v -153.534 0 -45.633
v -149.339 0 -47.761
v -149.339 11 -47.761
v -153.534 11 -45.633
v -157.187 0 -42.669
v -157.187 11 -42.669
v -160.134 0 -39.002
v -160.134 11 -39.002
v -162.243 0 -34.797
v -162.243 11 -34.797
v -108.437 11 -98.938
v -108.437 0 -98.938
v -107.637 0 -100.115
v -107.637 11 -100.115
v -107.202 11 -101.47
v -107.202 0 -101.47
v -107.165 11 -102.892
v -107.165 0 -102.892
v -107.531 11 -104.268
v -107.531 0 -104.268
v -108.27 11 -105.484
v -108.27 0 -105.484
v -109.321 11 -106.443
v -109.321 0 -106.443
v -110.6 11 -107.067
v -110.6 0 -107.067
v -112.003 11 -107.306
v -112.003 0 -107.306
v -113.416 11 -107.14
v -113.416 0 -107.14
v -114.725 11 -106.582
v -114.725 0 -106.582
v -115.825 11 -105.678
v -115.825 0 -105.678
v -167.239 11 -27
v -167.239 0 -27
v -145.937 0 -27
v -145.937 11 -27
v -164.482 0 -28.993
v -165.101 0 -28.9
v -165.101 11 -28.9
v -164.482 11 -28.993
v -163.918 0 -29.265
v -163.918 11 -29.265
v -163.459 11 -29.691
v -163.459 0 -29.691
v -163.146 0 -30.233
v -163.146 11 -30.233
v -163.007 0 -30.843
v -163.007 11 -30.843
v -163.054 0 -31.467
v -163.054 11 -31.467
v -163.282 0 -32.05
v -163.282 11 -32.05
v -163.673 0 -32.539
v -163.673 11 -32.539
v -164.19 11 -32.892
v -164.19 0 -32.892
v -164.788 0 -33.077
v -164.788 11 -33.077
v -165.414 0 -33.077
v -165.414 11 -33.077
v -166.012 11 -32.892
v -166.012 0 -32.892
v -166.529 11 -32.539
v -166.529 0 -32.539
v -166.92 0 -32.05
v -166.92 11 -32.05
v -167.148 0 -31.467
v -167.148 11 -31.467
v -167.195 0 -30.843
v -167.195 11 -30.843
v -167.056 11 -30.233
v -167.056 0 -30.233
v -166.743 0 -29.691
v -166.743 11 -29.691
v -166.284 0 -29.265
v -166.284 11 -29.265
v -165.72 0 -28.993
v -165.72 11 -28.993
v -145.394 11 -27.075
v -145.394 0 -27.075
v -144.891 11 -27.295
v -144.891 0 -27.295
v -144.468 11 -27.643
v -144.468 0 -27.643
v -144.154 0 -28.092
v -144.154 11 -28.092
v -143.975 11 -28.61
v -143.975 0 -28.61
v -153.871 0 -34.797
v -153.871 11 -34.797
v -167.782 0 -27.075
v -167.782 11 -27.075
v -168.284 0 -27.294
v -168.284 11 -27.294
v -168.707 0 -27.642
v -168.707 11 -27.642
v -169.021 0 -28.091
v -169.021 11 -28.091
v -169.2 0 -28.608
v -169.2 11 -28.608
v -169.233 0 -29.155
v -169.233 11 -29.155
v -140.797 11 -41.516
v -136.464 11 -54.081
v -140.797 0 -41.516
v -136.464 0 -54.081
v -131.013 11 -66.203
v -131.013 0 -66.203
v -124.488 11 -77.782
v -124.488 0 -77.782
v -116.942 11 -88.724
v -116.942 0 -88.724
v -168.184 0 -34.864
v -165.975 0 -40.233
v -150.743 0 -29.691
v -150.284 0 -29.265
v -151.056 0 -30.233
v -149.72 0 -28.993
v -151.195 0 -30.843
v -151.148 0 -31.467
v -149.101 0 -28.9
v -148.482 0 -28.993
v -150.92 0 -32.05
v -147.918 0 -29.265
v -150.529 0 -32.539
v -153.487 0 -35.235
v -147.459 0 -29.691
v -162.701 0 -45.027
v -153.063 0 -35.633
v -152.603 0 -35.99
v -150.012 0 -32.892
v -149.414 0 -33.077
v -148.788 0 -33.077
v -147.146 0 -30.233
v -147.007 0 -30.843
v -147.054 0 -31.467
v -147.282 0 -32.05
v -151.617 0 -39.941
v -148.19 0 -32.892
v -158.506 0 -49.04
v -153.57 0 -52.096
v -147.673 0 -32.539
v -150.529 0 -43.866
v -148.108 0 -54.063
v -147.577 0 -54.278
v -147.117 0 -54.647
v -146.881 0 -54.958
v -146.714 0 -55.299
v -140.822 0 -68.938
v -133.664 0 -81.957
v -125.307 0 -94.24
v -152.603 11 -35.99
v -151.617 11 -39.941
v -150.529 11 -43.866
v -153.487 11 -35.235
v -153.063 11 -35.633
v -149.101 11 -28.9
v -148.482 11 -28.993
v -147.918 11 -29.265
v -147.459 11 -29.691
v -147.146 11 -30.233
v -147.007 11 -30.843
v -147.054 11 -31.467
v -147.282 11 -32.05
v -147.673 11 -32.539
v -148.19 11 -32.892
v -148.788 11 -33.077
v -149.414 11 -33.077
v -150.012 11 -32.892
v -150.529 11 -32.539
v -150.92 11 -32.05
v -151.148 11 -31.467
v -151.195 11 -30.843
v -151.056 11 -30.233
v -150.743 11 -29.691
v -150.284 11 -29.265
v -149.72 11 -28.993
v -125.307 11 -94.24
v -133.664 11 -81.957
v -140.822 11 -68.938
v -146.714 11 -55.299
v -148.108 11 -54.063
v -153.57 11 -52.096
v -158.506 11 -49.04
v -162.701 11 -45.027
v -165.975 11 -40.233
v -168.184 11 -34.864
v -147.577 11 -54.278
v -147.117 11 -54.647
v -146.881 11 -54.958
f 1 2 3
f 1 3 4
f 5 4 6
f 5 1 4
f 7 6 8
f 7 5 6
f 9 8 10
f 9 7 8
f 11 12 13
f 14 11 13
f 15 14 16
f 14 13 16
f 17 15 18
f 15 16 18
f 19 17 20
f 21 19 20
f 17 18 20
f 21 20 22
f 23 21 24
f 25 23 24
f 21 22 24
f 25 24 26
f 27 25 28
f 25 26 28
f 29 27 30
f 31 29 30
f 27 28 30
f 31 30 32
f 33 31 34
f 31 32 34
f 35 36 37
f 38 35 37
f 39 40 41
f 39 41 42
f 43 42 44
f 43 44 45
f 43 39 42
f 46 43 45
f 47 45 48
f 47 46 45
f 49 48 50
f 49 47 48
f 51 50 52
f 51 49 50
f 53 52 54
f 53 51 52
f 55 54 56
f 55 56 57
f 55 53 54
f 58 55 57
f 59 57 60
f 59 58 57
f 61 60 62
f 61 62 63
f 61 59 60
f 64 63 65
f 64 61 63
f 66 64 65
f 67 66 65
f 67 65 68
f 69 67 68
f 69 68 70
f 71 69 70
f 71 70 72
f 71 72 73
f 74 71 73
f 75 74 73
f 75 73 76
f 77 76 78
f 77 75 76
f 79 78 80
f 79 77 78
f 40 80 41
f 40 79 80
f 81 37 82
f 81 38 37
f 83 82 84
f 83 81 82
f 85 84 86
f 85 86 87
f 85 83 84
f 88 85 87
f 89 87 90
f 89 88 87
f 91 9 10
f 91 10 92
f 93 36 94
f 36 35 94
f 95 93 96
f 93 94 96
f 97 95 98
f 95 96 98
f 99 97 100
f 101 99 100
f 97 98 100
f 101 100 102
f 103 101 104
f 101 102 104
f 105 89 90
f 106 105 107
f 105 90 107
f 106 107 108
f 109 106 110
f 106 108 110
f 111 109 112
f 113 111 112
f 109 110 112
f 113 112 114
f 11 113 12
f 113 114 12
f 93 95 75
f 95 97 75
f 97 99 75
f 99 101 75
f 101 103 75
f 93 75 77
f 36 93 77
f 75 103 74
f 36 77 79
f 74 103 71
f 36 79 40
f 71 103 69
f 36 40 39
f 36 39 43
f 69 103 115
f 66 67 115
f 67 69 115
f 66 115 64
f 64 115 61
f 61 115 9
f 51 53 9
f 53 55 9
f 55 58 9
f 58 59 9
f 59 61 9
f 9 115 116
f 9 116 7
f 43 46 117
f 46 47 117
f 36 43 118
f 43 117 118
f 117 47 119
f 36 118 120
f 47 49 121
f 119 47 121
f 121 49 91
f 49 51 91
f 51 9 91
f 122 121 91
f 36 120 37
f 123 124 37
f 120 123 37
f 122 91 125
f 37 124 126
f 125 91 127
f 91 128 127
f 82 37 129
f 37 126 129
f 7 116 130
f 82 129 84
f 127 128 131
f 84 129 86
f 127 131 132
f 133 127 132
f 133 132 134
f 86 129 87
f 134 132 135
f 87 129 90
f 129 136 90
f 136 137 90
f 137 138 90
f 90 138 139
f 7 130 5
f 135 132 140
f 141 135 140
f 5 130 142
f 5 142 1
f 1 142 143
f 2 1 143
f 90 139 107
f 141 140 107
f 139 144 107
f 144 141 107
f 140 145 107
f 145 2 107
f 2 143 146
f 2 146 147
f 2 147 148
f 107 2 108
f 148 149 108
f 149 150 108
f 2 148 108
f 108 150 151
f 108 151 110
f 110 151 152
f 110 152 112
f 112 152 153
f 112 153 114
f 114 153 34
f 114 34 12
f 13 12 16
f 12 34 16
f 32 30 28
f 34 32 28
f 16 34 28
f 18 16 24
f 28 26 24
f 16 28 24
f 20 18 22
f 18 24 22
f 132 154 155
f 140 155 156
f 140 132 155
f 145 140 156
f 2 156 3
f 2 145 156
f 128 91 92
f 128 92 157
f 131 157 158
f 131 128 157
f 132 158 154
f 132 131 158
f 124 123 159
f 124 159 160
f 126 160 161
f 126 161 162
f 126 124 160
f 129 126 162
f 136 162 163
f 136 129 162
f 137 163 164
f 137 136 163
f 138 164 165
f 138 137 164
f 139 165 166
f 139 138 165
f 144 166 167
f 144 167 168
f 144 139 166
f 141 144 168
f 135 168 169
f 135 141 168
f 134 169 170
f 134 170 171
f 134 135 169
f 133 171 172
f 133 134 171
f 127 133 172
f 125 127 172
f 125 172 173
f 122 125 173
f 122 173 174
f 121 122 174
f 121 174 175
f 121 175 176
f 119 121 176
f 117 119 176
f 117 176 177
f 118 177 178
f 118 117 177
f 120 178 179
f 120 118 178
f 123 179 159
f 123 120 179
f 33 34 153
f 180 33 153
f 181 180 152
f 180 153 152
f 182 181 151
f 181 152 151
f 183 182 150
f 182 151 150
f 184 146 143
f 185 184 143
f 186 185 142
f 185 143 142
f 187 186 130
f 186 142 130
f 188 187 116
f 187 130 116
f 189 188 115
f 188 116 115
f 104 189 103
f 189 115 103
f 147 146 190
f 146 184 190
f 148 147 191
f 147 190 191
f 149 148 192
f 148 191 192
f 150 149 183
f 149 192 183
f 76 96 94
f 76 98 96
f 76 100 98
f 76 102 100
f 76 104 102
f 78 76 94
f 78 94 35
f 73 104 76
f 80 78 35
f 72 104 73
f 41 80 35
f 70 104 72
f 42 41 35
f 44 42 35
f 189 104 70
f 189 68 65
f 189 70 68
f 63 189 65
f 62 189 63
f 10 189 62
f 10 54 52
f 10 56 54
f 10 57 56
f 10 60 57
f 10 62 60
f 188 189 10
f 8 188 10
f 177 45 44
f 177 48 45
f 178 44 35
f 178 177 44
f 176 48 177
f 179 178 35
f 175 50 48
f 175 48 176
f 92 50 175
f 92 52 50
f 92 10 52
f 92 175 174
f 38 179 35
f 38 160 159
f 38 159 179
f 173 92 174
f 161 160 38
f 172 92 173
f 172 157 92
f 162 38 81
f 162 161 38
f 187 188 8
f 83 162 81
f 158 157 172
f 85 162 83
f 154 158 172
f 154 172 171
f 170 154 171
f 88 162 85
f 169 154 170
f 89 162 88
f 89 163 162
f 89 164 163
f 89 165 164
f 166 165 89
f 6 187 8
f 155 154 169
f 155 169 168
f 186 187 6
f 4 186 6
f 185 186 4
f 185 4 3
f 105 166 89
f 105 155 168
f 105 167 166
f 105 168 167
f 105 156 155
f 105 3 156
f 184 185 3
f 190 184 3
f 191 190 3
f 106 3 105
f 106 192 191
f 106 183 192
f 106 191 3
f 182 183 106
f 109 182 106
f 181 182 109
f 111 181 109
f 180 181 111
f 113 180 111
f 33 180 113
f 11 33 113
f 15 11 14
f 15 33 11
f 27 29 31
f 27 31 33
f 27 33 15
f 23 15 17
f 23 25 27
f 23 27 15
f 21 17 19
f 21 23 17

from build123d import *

# Parameters (mm, degrees)
SKETCH1_R           = 2.1
BOSS_EXTRUDE1_DEPTH = 11
FILLET1_R           = 2


with BuildPart() as part:
    # Sketch1 → Boss-Extrude1 (new body)
    with BuildSketch(Plane(origin=(0, 0, 0), x_dir=(1, 0, 0), z_dir=(0, 1, 0))):
        with BuildLine():
            Line((-169.316682473, 27), (-144.285495113, 27))
            ThreePointArc((-144.285495113, 27), (-131.38096704, 65.470188633), (-108.437297629, 98.937639869))
            ThreePointArc((-108.437297629, 98.937639869), (-108.760877497, 106.001300115), (-115.824537743, 105.677720247))
            ThreePointArc((-115.824537743, 105.677720247), (-133.944213048, 81.498784597), (-147.089597617, 54.293225847))
            ThreePointArc((-147.089597617, 54.293225847), (-163.056941322, 44.599456514), (-169.316682473, 27))
        make_face()
        with Locations(Location((-149.101129521, 31, 0), (0, 0, 270))):
            Circle(SKETCH1_R, mode=Mode.SUBTRACT)
        with Locations(Location((-165.101129521, 31, 0), (0, 0, 270))):
            Circle(SKETCH1_R, mode=Mode.SUBTRACT)
        with BuildLine():
            Line((-162.242742421, 34.797226479), (-153.870589387, 34.797226479))
            ThreePointArc((-153.870589387, 34.797226479), (-153.279814844, 35.43906131), (-152.603484102, 35.990008892))
            ThreePointArc((-152.603484102, 35.990008892), (-151.085722301, 41.907142789), (-149.338618997, 47.76066348))
            ThreePointArc((-149.338618997, 47.76066348), (-157.187118972, 42.668993907), (-162.242742421, 34.797226479))
        make_face(mode=Mode.SUBTRACT)
    extrude(amount=BOSS_EXTRUDE1_DEPTH)

    # Fillet1
    fillet1_edges = [part.edges().sort_by_distance(p)[0] for p in [
        (-147.089597617, 5.5, -54.293225847),
        (-144.285495113, 5.5, -27),
        (-169.316682473, 5.5, -27),
    ]]
    fillet(fillet1_edges, radius=FILLET1_R)


solid = part.part
